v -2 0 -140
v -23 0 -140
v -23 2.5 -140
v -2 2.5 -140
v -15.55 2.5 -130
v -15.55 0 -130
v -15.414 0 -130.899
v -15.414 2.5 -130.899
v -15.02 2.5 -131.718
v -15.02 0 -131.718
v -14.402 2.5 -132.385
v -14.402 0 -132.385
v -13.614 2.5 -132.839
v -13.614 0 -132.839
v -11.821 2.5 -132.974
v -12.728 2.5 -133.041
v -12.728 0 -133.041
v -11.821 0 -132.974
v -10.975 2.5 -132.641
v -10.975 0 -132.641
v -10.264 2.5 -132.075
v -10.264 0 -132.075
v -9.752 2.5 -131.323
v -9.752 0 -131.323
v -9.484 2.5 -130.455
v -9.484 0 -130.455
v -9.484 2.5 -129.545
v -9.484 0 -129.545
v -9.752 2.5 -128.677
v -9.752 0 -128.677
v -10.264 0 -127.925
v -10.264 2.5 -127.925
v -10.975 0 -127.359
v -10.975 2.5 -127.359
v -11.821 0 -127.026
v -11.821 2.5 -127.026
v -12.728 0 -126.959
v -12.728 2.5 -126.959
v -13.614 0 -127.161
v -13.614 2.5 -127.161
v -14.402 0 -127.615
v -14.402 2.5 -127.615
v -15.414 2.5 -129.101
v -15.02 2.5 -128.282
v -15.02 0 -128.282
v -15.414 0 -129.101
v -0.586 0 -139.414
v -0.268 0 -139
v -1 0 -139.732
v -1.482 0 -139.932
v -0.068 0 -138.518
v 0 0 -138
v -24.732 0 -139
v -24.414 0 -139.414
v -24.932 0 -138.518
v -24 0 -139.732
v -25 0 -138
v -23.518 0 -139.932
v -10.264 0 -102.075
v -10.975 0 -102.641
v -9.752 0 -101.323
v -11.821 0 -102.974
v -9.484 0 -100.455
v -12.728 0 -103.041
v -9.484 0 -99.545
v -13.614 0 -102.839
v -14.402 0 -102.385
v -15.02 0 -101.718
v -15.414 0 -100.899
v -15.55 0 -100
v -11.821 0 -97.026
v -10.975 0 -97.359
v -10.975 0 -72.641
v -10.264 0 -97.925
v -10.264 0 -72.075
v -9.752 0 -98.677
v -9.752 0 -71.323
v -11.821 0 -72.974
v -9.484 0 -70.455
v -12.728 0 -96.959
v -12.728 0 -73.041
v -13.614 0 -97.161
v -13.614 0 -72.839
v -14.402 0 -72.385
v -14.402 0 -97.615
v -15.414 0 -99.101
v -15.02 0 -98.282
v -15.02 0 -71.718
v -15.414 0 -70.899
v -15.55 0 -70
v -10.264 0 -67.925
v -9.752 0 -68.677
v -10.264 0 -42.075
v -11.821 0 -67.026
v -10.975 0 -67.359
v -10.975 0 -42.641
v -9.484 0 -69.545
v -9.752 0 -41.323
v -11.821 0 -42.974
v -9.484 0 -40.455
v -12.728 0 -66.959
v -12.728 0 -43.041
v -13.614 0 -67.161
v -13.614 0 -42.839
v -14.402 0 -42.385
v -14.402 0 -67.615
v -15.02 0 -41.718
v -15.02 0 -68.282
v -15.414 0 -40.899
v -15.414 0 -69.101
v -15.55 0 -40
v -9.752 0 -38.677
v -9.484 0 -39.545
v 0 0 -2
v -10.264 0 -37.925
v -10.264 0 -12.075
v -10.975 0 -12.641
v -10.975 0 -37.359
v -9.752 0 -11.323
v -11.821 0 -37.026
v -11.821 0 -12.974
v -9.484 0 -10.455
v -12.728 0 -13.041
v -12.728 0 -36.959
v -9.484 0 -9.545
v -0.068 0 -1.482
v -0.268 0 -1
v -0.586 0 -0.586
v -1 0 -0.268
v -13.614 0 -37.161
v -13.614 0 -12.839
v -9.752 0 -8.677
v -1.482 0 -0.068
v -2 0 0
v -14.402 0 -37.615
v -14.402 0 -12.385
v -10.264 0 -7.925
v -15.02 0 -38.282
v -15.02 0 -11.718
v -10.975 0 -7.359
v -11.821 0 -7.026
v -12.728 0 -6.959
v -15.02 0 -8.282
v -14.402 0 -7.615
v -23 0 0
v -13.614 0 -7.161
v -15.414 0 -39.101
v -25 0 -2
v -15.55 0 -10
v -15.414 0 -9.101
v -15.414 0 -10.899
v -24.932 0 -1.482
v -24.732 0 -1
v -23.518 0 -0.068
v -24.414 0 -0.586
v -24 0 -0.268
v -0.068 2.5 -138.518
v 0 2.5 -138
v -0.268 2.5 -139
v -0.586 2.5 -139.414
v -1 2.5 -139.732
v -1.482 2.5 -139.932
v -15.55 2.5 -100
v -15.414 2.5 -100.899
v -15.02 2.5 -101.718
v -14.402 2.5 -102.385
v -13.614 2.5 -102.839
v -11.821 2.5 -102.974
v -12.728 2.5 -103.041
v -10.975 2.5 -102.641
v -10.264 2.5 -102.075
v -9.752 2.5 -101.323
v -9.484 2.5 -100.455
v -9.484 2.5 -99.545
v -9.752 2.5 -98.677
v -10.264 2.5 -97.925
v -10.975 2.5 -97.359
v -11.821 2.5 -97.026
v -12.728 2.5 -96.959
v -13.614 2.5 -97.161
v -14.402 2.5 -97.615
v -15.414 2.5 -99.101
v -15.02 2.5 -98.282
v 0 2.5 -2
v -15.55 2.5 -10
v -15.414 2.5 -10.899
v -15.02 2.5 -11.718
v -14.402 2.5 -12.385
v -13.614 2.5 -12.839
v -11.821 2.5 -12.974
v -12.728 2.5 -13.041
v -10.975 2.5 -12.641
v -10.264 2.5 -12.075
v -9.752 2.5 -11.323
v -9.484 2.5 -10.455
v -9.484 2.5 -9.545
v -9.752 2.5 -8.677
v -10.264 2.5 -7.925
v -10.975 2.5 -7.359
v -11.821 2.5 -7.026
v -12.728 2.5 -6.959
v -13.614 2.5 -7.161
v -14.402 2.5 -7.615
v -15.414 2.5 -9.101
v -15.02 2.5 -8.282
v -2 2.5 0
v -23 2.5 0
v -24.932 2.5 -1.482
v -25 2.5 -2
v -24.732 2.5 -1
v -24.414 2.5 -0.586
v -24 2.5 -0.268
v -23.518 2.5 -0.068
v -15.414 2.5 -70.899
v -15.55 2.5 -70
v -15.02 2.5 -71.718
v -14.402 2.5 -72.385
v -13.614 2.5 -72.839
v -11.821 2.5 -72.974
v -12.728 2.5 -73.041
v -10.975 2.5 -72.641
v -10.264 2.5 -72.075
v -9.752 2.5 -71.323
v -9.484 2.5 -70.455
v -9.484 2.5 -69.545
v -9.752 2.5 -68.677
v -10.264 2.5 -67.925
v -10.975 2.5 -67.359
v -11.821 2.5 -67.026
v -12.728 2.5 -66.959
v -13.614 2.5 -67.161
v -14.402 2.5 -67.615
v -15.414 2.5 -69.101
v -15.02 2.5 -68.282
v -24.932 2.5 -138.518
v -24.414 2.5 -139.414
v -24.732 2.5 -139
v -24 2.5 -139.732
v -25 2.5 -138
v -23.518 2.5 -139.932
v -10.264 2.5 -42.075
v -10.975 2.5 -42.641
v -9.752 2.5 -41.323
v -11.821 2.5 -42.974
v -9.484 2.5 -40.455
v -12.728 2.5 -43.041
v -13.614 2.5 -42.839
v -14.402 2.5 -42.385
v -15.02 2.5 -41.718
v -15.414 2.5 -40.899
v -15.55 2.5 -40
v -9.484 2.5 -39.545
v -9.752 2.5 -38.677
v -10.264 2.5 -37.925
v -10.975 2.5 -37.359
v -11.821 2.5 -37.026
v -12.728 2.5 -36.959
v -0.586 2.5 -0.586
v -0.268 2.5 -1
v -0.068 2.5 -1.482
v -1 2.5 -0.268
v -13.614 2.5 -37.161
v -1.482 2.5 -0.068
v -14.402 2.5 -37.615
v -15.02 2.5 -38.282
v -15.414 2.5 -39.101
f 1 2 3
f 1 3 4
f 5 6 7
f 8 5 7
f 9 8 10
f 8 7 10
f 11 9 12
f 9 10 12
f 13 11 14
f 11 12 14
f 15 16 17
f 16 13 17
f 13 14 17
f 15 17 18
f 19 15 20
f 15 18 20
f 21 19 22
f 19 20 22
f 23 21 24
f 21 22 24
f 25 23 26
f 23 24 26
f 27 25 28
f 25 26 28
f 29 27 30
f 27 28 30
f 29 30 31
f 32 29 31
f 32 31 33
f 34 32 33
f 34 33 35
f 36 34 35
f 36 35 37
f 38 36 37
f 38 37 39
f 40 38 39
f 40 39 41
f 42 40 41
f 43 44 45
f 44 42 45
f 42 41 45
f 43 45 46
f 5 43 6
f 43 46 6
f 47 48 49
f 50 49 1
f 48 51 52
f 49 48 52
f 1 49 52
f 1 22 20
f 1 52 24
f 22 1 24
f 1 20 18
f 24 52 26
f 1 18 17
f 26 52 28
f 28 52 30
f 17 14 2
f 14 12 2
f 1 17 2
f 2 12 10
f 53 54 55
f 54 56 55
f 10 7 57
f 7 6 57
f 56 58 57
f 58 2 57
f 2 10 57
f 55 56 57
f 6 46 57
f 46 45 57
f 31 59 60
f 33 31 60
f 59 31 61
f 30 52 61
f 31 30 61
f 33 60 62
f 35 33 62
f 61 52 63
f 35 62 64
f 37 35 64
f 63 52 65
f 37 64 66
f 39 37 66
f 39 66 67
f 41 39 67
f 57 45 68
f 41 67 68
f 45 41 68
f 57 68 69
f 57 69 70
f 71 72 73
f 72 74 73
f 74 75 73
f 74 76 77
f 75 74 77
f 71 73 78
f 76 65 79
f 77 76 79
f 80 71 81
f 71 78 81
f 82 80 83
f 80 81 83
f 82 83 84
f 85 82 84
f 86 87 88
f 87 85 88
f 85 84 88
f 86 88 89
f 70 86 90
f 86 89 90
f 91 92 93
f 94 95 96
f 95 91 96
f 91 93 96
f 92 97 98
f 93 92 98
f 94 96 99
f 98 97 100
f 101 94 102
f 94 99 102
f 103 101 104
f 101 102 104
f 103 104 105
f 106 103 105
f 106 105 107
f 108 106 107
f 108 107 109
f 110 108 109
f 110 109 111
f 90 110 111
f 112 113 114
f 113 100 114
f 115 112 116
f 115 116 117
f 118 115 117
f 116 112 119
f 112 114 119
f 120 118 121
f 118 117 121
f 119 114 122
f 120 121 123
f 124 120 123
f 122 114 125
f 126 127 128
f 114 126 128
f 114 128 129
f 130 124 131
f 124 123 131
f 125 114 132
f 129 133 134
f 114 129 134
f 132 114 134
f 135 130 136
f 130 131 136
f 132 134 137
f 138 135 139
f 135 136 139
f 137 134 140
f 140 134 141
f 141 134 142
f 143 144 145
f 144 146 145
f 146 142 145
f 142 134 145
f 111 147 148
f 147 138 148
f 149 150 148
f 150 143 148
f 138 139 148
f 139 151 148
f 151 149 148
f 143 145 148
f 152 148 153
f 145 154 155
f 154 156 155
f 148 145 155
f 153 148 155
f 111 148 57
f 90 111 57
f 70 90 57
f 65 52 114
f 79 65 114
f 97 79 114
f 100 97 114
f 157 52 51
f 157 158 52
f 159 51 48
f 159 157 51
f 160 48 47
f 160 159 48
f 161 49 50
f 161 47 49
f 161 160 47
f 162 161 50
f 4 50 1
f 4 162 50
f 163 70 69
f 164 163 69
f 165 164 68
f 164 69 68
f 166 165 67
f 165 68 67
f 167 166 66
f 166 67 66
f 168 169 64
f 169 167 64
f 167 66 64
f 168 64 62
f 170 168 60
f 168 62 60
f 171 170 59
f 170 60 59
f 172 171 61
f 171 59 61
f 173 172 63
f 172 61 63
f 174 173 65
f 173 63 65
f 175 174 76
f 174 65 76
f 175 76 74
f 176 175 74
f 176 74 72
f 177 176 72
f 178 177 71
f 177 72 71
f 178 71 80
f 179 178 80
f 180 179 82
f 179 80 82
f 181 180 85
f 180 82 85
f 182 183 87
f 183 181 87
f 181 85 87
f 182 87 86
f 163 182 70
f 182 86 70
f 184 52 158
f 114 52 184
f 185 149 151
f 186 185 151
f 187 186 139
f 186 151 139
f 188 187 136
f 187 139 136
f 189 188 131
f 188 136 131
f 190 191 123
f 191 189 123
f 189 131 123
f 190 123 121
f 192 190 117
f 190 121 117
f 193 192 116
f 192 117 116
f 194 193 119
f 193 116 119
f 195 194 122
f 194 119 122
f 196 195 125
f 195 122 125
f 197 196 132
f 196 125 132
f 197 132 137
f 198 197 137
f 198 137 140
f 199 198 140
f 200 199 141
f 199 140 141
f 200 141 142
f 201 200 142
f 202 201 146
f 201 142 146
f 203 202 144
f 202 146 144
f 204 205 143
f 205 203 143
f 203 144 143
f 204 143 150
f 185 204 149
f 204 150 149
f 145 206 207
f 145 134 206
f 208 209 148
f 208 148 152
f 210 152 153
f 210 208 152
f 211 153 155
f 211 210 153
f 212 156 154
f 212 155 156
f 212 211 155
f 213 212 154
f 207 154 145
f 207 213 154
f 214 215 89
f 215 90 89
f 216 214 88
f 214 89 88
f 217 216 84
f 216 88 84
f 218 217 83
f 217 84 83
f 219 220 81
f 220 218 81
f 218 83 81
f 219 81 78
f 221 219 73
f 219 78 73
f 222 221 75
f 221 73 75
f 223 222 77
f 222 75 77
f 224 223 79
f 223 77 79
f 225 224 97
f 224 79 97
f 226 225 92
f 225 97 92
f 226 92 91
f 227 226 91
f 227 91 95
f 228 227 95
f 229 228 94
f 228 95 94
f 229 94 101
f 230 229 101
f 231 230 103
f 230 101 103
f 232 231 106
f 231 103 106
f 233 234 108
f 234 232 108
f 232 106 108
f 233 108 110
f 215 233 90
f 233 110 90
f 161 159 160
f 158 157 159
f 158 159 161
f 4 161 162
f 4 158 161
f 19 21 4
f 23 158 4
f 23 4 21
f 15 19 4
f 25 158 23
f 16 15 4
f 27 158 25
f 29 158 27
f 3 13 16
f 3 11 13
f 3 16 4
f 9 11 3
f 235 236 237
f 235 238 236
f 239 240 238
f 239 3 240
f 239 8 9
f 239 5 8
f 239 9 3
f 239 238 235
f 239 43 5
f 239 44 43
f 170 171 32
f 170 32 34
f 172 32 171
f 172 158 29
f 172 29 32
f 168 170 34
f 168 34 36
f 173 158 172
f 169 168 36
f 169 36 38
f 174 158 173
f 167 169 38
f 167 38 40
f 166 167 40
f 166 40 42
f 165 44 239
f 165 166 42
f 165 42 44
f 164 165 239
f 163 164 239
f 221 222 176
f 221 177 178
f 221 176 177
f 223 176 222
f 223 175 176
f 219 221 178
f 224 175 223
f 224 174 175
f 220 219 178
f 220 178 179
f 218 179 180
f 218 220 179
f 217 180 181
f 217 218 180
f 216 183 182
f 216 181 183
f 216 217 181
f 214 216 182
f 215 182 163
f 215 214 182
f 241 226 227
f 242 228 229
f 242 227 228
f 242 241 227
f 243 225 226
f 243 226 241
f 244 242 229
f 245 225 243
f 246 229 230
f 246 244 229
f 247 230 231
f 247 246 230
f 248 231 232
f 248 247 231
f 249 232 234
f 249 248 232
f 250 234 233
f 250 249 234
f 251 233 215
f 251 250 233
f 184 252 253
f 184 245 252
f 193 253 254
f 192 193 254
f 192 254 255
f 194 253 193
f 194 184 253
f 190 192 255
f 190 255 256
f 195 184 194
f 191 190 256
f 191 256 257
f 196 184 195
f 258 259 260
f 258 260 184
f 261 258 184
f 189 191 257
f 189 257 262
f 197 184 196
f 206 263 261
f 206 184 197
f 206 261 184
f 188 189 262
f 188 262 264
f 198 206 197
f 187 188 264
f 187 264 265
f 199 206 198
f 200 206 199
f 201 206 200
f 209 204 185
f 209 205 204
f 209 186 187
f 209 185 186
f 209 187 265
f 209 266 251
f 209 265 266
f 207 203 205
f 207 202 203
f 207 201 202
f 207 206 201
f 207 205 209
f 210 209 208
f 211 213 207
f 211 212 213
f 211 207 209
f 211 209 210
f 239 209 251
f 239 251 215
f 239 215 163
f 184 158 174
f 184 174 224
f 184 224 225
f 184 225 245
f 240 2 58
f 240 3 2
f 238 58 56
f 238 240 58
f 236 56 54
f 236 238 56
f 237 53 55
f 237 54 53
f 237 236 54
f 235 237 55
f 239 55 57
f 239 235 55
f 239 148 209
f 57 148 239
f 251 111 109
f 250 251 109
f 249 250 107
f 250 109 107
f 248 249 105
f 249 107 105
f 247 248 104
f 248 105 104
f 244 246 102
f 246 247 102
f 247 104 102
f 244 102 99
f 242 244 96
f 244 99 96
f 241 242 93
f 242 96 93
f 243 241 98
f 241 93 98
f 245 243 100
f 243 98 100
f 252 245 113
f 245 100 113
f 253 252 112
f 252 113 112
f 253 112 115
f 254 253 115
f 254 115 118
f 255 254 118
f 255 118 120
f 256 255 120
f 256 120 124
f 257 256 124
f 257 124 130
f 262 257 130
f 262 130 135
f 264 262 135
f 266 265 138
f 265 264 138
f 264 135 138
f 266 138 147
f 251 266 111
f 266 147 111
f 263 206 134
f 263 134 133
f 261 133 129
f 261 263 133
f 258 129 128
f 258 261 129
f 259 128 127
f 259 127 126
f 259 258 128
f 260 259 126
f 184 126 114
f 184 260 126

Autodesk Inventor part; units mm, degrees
ref_plane "YZ Plane" through (0, 0, 0) normal (1, 0, 0) x (0, 1, 0)
ref_plane "XZ Plane" through (0, 0, 0) normal (0, 1, 0) x (-1, 0, 0)
ref_plane "XY Plane" through (0, 0, 0) normal (0, 0, 1) x (1, 0, 0)
sketch "Sketch1" plane through (0, 0, 0) normal (0, 1, 0) x (-1, 0, 0)
  line L0 (0, 0) -> (25, 0)
  line L1 (25, 0) -> (25, -140)
  line L2 (25, -140) -> (0, -140)
  line L3 (0, -140) -> (0, 0)
  circle A0 centre (12.5, -10) radius 3.05
  circle A1 centre (12.5, -70) radius 3.05
  circle A2 centre (12.5, -130) radius 3.05
  line L4 (25, -70) -> (0, -70) construction
  line L5 (12.5, 0) -> (12.5, -140) construction
  circle A3 centre (12.5, -40) radius 3.05
  circle A4 centre (12.5, -100) radius 3.05
  dimension "d0" = 25
  dimension "d1" = 140
  dimension "d2" = 6.1
  dimension "d3" = 6.1
  dimension "d4" = 6.1
  dimension "d5" = 10
  dimension "d6" = 10
  dimension "d7" = 6.1
  dimension "d8" = 6.1
  dimension "d9" = 30
  dimension "d10" = 30
extrude "Extrusion1" add sketch "Sketch1" along normal blind 2.5
fillet "Fillet1" radius 2 4 edges at (0, 1.25, 0) (-25, 1.25, 0) (0, 1.25, -140) (-25, 1.25, -140)
equation "\"BendRadius\" = Thickness"
equation "\"BendReliefWidth\" = Thickness"
equation "\"BendReliefDepth\" = 0.5 * Thickness"
equation "\"CornerReliefSize\" = 4 * Thickness"
equation "\"MinimumRemnant\" = 2 * Thickness"
equation "\"TransitionRadius\" = BendRadius"
equation "\"JacobiRadiusSize\" = BendRadius"
equation "\"GapSize\" = Thickness"
equation "\"Thickness\" = 0.5"
properties part number "Connector"
